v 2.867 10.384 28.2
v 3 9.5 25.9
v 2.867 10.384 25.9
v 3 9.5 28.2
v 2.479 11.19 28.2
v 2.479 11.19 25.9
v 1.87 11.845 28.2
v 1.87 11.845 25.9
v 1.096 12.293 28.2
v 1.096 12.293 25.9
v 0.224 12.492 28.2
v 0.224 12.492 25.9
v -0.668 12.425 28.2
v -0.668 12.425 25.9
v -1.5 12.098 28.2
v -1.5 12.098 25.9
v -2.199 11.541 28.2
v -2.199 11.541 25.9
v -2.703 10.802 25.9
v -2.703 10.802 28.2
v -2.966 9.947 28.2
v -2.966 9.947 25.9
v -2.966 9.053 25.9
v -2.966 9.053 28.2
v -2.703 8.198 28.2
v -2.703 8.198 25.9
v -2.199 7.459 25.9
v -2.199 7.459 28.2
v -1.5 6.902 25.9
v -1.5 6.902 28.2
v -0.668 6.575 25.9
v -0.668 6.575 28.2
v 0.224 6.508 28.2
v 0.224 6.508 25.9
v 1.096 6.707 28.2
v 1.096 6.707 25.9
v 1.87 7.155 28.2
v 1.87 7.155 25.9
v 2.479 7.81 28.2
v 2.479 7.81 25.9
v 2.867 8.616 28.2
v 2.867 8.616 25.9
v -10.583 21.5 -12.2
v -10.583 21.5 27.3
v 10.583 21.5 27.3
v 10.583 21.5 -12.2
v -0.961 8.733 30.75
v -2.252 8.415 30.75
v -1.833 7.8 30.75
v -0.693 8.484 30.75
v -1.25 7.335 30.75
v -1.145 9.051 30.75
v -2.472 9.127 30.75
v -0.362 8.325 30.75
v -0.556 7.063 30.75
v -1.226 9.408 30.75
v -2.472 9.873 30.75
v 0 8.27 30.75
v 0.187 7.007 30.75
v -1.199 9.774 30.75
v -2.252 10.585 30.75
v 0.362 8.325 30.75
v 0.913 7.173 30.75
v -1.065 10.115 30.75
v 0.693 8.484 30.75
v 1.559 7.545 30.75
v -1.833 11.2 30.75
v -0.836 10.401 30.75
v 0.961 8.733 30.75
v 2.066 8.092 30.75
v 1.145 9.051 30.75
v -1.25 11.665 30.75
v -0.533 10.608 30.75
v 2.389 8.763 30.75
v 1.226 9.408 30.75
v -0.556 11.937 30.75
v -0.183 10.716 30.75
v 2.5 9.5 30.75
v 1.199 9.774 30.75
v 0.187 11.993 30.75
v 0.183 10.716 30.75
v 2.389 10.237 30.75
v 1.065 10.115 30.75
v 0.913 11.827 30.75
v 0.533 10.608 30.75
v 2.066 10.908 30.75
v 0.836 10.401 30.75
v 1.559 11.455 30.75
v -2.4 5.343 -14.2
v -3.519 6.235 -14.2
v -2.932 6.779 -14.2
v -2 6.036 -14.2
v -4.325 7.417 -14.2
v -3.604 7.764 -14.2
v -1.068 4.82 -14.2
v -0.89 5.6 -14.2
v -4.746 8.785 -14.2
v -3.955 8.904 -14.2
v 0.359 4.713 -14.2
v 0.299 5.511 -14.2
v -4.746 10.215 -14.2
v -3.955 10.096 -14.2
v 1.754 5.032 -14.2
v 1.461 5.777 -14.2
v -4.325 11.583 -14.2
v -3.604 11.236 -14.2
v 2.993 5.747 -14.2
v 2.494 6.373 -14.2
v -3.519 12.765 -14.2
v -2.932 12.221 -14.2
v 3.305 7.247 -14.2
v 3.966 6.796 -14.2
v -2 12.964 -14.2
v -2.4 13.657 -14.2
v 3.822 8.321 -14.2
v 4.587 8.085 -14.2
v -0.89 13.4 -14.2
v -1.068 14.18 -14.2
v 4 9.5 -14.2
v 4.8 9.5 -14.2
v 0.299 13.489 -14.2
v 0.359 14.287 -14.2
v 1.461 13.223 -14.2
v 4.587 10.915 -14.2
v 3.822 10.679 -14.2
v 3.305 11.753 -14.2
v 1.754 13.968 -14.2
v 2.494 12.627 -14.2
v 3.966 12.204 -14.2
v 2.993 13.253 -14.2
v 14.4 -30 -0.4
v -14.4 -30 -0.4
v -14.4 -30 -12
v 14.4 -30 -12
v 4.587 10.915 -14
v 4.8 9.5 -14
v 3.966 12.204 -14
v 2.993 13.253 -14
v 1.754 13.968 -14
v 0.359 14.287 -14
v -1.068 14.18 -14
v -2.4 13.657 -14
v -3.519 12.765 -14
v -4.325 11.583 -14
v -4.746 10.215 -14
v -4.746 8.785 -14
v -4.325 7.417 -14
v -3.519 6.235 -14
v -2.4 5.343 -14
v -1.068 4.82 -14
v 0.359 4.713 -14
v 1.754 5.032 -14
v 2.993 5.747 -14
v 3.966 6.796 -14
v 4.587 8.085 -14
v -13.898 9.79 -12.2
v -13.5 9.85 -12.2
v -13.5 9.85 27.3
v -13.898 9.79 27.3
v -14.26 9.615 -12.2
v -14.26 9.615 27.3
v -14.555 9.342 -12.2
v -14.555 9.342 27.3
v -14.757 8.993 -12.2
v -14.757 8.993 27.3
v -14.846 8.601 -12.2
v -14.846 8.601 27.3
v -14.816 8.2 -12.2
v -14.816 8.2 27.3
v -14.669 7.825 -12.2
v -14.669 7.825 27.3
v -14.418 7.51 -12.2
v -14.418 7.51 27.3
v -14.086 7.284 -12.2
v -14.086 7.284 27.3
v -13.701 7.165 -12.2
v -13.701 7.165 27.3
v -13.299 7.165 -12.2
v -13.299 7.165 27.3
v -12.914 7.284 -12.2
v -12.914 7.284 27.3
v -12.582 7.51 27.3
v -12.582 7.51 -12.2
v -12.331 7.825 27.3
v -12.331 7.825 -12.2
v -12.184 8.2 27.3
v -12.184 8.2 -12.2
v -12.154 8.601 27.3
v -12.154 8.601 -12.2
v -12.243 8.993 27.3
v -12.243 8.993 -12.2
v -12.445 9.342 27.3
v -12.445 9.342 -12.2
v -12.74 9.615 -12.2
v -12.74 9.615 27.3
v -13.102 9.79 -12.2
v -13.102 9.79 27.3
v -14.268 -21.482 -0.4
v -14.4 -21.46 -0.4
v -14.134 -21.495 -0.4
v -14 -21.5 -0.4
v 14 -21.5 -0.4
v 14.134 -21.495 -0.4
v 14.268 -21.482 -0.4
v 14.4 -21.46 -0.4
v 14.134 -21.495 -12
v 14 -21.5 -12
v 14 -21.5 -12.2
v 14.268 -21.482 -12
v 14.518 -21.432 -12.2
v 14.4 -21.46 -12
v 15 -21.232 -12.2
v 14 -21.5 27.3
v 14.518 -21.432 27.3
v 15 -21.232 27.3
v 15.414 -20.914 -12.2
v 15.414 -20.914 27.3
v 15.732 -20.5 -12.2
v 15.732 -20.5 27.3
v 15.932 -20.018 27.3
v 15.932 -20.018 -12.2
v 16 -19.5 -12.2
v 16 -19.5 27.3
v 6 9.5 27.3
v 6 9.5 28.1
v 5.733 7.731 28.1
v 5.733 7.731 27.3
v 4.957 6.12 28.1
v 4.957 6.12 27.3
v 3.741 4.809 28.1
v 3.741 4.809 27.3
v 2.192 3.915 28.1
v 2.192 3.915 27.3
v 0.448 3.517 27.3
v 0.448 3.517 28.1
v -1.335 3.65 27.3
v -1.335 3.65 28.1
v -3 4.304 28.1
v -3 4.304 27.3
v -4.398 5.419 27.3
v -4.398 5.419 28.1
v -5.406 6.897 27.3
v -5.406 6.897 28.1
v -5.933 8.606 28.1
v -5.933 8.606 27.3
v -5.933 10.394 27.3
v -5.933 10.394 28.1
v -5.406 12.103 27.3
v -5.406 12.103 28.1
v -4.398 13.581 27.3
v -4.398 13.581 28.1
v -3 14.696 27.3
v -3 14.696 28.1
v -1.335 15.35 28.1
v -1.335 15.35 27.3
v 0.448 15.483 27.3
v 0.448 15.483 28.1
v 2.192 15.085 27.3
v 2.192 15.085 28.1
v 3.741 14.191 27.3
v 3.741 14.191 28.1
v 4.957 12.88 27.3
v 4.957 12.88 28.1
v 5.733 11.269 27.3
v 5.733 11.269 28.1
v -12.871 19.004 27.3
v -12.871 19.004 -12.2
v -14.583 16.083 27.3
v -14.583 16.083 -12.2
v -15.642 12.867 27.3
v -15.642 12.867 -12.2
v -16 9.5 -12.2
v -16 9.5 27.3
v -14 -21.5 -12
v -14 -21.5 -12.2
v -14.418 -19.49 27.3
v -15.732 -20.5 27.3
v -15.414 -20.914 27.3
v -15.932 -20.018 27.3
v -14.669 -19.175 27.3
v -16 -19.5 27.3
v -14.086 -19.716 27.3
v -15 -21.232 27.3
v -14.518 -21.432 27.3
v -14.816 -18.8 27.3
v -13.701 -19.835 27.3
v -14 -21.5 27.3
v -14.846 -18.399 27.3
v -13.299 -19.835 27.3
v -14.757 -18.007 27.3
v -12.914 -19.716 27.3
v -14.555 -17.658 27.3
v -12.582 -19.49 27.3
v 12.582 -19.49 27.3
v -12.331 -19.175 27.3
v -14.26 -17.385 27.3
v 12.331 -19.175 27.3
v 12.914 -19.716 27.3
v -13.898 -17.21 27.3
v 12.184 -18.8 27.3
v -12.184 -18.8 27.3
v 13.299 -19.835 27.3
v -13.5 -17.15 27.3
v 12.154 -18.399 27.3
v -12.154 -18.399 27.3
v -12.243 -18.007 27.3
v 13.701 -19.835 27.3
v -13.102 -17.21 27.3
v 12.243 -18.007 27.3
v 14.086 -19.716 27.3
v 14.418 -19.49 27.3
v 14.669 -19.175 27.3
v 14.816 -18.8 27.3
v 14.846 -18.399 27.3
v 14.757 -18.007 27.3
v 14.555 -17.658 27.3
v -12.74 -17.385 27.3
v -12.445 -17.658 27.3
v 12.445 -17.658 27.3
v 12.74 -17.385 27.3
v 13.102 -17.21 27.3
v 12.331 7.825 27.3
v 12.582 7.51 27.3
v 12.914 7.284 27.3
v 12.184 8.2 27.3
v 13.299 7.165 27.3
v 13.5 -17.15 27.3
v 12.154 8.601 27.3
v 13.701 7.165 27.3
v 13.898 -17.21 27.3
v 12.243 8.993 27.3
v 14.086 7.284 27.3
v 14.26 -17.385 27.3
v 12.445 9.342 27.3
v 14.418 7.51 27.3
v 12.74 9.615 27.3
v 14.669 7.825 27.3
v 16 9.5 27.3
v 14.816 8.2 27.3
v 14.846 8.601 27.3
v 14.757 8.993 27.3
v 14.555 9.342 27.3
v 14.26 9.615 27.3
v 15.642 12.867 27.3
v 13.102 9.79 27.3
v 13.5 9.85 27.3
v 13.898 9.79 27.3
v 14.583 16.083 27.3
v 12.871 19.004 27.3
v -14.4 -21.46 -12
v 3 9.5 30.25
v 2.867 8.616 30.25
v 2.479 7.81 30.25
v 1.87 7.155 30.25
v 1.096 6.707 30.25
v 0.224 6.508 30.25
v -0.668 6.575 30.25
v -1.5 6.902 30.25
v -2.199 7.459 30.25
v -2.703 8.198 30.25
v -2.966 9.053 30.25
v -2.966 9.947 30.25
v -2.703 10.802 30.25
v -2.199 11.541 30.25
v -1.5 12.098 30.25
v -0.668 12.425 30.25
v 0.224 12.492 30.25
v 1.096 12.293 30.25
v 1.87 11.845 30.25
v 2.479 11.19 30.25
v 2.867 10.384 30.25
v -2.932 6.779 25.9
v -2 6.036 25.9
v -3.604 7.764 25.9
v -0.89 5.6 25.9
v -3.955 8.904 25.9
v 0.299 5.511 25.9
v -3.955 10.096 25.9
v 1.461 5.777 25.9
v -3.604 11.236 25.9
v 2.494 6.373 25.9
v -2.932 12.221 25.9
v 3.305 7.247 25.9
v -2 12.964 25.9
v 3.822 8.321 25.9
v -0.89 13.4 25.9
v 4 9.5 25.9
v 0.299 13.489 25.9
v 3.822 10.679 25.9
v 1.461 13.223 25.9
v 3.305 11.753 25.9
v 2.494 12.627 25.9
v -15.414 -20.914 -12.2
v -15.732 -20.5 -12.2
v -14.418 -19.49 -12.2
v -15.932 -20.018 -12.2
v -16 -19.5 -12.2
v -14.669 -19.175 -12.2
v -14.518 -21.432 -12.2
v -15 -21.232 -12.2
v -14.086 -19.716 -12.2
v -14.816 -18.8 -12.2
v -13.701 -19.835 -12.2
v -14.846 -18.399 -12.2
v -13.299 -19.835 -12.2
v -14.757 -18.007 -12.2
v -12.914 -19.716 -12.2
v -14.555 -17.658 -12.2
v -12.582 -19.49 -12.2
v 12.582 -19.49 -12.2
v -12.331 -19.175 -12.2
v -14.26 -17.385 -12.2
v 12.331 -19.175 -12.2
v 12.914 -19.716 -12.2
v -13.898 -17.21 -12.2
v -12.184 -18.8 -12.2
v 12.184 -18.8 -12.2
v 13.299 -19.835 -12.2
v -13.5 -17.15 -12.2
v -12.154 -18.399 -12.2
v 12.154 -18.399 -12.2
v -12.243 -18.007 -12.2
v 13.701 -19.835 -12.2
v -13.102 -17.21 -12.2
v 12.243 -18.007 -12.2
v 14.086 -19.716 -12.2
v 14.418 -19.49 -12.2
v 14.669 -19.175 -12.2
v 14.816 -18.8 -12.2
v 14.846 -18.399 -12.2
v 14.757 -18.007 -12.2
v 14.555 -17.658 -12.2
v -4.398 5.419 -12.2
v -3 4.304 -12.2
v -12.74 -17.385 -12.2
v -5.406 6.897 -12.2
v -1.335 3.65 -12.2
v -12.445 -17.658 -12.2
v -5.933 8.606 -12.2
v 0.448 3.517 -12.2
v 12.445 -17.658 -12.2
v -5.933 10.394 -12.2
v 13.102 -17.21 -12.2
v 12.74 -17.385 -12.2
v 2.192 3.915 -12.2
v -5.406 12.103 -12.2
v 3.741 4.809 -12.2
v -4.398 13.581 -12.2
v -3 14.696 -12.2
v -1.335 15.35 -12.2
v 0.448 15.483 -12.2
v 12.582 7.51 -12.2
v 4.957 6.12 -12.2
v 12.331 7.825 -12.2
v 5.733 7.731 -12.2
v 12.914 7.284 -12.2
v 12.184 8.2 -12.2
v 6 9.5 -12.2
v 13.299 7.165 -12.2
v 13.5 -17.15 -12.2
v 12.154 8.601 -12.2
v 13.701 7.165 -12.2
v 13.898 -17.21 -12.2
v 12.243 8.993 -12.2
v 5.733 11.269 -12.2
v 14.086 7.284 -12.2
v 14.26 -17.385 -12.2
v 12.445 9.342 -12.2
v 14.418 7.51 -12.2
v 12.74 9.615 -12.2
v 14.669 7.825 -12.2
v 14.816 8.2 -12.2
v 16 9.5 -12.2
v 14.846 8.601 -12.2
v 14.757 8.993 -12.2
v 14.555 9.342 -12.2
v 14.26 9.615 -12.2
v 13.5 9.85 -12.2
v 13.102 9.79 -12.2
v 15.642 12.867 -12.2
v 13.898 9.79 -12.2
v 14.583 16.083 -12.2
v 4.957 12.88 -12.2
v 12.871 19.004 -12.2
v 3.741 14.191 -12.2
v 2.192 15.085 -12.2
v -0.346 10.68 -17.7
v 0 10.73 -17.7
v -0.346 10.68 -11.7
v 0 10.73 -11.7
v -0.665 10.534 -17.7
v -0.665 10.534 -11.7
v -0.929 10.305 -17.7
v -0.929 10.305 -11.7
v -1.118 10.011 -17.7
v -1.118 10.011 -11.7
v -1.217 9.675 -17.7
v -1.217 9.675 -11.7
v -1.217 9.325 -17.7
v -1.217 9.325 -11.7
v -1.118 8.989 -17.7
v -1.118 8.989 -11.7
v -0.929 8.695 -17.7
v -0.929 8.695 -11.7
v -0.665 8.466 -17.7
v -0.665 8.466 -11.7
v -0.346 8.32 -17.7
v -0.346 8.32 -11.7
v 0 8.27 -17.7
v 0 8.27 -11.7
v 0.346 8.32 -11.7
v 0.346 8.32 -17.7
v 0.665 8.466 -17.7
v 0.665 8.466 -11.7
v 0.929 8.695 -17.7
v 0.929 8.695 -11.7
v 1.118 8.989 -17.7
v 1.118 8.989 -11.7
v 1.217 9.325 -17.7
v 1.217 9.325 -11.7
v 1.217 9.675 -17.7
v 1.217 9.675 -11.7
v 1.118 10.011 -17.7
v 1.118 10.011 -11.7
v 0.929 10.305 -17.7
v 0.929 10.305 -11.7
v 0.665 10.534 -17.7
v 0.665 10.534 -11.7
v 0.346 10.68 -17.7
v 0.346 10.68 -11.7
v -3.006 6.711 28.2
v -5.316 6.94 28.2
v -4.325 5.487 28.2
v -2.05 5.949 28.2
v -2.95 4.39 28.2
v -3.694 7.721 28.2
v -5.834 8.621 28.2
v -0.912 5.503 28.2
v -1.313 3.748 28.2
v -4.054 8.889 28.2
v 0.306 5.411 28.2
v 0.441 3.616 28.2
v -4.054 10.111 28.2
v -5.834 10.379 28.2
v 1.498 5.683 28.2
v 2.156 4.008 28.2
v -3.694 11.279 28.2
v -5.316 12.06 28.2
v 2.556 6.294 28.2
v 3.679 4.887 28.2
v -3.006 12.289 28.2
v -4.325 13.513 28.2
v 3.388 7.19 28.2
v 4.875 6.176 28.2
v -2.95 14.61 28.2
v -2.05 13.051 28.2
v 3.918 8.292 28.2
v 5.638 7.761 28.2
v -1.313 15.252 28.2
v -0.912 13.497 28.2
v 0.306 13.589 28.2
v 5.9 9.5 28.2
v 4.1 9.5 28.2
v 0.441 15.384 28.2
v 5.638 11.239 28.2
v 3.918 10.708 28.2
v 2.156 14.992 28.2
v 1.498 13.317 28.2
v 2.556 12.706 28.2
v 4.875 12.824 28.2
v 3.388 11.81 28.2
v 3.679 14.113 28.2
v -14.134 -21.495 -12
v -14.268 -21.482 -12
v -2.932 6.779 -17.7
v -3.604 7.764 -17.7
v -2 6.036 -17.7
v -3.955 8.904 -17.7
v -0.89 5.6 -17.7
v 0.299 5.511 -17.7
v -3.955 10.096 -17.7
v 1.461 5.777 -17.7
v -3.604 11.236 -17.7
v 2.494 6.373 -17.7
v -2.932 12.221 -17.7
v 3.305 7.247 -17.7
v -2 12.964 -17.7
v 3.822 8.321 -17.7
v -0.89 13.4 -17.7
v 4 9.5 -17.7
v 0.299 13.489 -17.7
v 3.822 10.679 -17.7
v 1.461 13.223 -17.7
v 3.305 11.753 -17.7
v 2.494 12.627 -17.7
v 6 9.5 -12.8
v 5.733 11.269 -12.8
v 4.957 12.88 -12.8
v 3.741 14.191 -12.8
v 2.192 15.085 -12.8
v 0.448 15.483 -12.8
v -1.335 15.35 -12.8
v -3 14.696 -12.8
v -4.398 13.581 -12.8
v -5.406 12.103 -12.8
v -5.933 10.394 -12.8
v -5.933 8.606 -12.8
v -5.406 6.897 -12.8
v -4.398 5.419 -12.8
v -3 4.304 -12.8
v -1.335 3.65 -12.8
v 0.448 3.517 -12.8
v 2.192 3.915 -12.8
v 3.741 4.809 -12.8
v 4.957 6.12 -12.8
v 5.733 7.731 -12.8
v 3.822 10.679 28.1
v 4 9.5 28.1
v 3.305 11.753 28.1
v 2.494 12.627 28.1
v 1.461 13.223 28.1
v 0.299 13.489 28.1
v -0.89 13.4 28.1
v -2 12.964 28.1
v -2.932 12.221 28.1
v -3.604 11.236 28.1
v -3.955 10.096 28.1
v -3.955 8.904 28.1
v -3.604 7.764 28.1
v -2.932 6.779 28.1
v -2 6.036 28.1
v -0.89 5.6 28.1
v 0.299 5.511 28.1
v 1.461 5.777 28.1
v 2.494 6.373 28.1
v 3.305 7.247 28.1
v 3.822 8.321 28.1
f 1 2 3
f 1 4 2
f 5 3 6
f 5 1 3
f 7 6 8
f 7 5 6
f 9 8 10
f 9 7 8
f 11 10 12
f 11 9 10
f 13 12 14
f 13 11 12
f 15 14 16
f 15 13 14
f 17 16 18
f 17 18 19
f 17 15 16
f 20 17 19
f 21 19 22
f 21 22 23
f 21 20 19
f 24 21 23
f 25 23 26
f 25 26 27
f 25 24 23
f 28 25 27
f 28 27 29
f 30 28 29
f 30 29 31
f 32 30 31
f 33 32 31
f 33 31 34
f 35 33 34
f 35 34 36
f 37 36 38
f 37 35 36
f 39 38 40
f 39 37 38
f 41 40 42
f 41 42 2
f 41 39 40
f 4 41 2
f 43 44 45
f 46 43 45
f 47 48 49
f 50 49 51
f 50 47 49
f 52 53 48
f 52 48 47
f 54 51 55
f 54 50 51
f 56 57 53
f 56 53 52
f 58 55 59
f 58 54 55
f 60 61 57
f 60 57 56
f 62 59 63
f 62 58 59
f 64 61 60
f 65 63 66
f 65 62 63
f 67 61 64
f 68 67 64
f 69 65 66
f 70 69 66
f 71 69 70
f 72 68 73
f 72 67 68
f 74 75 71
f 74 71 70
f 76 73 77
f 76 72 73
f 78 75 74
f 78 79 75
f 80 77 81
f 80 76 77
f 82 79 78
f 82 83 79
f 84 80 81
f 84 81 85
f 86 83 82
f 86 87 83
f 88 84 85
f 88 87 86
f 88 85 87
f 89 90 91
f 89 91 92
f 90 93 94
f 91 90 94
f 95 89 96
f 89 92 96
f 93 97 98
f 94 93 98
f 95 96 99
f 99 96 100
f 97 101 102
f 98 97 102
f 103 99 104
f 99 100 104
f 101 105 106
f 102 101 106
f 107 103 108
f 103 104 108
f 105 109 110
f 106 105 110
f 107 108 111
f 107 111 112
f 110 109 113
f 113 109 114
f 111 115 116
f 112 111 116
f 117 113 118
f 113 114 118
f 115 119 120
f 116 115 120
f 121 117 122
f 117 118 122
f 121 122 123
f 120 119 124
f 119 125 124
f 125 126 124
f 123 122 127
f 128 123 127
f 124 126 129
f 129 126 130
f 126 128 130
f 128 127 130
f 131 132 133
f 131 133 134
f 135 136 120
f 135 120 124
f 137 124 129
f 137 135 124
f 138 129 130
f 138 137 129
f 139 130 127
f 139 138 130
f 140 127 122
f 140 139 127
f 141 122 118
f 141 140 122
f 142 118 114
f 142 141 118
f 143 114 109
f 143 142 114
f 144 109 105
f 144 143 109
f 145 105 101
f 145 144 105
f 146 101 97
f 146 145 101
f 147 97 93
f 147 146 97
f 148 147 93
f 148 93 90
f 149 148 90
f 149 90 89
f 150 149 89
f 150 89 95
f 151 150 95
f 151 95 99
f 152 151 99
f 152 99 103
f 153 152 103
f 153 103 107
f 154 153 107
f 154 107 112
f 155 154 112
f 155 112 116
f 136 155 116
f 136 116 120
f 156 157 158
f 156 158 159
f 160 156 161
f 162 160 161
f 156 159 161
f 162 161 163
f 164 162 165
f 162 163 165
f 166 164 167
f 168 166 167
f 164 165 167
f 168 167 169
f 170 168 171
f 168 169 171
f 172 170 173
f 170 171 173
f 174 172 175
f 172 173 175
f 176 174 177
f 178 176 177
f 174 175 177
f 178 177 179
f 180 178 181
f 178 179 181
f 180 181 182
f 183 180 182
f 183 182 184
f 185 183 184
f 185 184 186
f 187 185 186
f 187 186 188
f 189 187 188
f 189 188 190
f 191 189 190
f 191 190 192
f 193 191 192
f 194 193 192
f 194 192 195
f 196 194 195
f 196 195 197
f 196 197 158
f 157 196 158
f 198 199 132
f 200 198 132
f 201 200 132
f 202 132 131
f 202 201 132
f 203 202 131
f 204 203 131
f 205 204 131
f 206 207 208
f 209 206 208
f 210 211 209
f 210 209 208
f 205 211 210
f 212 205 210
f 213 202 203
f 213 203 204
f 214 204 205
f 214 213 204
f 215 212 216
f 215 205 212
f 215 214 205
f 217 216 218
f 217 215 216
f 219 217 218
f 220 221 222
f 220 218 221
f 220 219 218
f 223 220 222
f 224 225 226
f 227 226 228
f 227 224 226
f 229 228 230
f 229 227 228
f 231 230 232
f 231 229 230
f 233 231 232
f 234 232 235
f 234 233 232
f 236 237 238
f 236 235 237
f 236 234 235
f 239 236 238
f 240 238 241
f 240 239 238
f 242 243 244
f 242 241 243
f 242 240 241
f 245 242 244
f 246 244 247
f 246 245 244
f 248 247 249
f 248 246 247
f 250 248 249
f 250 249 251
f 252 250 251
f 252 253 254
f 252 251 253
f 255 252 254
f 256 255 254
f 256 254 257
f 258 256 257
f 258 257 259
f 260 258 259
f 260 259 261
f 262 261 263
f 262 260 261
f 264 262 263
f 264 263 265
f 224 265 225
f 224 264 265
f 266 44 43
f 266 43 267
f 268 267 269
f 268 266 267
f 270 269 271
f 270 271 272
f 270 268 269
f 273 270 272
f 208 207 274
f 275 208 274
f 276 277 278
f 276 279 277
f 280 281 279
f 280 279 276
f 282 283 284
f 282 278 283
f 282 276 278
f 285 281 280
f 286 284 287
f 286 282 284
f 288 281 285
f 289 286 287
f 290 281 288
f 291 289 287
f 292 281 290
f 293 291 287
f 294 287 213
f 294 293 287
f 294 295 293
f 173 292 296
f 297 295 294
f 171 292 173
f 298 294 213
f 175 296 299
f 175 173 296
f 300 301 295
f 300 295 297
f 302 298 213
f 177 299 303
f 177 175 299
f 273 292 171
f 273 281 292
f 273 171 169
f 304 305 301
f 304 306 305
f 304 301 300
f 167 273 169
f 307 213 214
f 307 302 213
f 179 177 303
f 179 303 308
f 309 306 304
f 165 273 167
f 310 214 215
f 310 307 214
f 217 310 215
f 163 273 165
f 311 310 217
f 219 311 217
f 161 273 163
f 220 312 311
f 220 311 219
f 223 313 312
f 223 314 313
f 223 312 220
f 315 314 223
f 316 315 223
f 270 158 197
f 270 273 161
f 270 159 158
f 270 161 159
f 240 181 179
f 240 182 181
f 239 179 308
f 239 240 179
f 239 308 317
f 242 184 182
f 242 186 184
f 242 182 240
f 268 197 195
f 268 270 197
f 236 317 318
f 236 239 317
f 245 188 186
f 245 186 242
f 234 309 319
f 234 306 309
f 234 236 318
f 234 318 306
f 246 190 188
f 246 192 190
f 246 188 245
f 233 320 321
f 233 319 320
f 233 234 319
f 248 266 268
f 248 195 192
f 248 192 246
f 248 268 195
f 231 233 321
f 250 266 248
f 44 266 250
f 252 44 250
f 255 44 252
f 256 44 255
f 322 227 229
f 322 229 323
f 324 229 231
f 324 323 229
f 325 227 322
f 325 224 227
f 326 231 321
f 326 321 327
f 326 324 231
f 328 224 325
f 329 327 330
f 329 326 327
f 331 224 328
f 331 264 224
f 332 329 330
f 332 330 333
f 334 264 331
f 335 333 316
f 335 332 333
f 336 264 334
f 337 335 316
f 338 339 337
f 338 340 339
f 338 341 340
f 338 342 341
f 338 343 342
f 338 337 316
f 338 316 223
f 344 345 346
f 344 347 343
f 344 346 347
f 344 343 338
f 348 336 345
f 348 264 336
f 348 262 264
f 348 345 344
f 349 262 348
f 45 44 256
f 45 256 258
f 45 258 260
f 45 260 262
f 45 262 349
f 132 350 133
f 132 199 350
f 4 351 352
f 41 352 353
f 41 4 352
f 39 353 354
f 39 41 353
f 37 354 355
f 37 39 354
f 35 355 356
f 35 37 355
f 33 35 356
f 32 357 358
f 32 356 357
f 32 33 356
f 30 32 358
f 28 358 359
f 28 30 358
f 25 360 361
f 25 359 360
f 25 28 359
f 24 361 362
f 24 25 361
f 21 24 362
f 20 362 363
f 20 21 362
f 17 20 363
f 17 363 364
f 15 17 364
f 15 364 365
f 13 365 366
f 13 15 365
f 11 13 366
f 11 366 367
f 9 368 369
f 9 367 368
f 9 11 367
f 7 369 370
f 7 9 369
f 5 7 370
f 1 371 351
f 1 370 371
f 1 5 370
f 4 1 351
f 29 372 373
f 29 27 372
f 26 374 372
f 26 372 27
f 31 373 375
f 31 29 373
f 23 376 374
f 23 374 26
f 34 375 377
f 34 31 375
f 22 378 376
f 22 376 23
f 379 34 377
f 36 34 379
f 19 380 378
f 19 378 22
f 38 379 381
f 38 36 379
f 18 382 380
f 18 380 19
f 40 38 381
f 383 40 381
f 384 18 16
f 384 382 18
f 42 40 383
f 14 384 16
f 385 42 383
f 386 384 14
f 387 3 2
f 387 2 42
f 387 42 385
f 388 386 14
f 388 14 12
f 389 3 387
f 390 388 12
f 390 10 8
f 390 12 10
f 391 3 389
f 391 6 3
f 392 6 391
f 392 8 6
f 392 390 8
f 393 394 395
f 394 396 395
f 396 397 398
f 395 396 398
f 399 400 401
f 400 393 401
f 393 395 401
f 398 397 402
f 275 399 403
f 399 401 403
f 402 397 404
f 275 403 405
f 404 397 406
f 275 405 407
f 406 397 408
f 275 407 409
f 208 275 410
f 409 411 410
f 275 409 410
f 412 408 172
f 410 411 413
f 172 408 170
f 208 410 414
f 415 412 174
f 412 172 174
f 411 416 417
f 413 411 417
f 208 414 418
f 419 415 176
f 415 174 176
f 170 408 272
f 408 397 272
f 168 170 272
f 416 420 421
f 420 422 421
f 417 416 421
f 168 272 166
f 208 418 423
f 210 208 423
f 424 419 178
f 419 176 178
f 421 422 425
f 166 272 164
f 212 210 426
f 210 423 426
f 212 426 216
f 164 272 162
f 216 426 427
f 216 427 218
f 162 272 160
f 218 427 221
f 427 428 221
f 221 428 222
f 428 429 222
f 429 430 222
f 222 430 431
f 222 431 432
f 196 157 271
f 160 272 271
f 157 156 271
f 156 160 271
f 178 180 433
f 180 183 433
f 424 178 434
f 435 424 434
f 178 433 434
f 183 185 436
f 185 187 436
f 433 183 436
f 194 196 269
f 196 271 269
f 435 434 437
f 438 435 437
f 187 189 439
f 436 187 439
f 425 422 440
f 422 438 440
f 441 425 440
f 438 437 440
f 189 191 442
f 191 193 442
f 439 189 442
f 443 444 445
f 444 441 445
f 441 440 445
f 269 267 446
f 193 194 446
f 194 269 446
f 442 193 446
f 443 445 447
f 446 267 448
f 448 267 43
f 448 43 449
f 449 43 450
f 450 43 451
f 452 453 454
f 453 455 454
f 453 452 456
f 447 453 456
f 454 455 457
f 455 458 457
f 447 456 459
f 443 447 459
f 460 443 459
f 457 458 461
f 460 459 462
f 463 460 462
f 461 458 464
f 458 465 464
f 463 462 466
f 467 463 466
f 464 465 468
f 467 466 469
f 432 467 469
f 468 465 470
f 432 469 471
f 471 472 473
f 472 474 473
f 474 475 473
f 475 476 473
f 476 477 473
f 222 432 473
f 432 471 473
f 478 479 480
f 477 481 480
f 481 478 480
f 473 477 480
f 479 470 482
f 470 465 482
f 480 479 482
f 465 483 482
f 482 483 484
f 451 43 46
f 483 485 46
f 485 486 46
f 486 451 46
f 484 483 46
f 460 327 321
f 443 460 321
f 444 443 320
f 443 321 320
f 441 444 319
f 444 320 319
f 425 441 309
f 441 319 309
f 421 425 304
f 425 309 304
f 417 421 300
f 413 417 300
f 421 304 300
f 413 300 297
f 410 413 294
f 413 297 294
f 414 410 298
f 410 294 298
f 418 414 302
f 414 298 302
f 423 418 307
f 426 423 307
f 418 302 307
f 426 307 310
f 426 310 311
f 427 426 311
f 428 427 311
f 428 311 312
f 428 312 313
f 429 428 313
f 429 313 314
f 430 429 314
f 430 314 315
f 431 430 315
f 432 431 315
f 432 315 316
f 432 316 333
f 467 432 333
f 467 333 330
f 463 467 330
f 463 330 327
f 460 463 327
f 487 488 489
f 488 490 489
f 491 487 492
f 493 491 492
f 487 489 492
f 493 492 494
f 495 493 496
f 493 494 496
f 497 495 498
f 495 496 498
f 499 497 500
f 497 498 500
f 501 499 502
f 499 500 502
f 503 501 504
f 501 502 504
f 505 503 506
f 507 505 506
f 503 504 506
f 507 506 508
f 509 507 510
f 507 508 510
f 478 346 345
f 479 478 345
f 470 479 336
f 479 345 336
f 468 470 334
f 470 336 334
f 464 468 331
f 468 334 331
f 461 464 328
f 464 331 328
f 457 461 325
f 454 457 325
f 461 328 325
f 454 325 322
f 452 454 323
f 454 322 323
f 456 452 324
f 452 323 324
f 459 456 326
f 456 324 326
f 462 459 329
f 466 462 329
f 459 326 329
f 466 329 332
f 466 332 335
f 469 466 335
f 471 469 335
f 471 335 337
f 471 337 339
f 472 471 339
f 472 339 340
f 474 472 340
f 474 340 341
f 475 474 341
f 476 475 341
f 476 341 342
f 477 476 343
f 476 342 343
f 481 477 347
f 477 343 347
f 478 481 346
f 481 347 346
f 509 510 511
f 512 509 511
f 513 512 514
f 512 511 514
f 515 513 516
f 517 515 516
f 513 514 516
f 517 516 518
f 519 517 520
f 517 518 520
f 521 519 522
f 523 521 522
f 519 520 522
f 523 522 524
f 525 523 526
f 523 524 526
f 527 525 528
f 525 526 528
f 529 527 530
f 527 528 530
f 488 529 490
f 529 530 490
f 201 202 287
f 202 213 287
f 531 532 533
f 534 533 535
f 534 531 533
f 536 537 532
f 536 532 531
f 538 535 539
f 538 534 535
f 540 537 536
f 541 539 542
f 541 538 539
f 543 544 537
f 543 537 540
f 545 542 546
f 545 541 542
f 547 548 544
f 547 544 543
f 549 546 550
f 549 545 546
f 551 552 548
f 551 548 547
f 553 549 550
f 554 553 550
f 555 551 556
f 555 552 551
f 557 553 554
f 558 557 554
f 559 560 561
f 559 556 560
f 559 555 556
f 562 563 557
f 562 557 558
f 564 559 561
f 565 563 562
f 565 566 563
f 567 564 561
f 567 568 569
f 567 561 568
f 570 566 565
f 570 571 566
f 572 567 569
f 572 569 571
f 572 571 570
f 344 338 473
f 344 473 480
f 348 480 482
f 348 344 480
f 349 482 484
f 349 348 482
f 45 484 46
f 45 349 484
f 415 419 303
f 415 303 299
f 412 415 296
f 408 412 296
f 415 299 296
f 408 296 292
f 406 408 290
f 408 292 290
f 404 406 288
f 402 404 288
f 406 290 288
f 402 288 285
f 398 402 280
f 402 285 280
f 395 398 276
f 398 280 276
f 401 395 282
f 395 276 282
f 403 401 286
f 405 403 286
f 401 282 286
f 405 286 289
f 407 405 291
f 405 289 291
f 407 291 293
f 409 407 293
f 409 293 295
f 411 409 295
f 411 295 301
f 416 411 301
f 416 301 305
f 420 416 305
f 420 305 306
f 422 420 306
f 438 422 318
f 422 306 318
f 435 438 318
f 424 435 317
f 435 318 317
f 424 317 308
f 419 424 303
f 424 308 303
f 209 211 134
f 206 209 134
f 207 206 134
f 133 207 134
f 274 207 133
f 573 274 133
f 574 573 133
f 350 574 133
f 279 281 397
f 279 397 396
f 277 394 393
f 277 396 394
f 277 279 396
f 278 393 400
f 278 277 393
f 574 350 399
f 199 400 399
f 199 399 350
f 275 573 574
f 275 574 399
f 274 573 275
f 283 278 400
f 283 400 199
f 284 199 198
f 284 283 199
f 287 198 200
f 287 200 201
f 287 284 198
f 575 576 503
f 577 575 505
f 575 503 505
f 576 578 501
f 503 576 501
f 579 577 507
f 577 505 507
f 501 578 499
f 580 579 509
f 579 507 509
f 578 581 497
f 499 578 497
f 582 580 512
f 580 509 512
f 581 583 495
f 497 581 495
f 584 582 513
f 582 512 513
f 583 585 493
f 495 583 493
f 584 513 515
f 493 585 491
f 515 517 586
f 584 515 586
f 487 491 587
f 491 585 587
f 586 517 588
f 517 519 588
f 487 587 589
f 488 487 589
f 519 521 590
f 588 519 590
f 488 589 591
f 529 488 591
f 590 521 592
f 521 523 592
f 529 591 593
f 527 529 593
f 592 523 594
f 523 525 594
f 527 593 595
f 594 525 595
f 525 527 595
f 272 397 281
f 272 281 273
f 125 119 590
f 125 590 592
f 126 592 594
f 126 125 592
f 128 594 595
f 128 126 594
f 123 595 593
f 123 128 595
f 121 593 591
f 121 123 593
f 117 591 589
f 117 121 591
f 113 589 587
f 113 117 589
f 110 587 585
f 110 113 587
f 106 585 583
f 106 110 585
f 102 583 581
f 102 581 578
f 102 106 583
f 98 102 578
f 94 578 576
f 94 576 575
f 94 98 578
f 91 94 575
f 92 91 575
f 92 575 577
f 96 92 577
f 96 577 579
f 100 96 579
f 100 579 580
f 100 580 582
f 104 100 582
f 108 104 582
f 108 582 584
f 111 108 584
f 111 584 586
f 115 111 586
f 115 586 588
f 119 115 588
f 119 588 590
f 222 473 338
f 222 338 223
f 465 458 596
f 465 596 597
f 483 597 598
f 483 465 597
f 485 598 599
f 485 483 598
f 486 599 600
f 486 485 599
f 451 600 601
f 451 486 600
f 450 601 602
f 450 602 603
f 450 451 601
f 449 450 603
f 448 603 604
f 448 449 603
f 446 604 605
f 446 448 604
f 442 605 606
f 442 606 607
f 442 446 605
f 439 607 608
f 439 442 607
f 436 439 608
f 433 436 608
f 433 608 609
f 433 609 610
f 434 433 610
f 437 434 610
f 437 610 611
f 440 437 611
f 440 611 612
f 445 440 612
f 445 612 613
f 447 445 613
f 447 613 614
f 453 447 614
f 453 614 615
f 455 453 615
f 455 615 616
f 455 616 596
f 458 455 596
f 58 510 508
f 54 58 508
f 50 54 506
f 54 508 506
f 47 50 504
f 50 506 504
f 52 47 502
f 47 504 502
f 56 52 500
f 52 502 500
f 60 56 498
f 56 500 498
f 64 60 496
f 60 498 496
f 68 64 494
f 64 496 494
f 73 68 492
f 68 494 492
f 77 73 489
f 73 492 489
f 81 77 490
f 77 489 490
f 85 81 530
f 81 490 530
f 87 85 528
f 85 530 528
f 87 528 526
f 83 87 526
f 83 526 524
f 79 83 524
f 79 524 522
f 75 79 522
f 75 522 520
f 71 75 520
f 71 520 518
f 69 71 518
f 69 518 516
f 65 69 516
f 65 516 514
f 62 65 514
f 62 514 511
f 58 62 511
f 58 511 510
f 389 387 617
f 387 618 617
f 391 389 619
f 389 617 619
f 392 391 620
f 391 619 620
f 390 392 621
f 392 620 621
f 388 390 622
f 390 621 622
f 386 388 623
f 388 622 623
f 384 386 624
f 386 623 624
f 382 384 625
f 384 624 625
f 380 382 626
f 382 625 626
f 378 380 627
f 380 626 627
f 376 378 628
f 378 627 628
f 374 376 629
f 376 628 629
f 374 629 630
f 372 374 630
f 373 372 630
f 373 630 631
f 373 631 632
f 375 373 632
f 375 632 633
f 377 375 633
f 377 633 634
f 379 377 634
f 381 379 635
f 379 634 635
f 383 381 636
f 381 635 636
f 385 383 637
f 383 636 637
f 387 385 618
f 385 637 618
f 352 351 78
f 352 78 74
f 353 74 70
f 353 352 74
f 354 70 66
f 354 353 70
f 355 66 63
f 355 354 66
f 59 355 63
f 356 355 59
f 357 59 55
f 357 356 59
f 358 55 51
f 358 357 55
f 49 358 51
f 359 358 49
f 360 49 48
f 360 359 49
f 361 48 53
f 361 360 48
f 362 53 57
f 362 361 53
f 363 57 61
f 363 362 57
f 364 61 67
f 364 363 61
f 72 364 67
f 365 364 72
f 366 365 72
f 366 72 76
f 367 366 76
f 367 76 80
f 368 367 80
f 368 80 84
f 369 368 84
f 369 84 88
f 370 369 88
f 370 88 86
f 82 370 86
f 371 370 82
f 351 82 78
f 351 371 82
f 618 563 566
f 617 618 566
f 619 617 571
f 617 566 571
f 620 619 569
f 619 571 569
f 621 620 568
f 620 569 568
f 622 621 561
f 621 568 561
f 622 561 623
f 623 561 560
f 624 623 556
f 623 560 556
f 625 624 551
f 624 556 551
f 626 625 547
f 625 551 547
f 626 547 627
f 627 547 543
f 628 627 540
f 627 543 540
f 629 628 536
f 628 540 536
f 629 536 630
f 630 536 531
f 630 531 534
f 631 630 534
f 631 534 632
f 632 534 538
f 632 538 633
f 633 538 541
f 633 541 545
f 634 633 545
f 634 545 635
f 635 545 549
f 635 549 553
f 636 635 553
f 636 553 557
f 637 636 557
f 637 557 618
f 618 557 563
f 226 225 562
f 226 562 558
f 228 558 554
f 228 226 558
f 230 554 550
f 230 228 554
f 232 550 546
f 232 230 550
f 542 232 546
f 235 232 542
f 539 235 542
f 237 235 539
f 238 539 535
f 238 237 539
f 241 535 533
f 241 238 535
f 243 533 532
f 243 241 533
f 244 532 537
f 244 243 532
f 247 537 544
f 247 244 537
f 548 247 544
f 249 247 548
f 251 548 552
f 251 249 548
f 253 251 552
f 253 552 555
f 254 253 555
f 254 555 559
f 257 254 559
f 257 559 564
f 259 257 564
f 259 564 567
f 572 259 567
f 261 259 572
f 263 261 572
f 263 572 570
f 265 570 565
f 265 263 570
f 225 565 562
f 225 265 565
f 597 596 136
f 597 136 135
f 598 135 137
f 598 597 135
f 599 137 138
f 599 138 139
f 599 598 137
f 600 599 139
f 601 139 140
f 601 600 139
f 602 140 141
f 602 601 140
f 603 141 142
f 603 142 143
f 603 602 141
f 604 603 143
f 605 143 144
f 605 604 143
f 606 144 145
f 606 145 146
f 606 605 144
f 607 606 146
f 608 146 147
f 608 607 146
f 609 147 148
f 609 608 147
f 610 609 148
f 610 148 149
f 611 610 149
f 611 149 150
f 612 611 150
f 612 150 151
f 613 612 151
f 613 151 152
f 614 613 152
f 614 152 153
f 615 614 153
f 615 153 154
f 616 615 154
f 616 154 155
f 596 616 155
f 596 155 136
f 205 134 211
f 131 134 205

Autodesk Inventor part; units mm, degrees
ref_plane "YZ Plane" through (0, 0, 0) normal (1, 0, 0) x (0, 1, 0)
ref_plane "XZ Plane" through (0, 0, 0) normal (0, 1, 0) x (-1, 0, 0)
ref_plane "XY Plane" through (0, 0, 0) normal (0, 0, 1) x (1, 0, 0)
sketch "スケッチ1" plane through (0, 0, 0) normal (0, 0, 1) x (1, 0, 0)
  line L0 (-16, 21.5) -> (-10.583, 21.5) construction
  line L1 (16, 21.5) -> (16, 9.5) construction
  line L2 (16, -21.5) -> (-16, -21.5)
  line L3 (-16, -21.5) -> (-16, 9.5)
  line L4 (-16, 21.5) -> (16, -21.5) construction
  line L5 (16, 21.5) -> (-16, -21.5) construction
  line L6 (-14.4, -21.5) -> (-14.4, -30)
  line L7 (-14.4, -30) -> (14.4, -30)
  line L8 (0, 21.5) -> (0, -21.5) construction
  line L9 (14.4, -21.5) -> (14.4, -30)
  line L10 (-13.5, 21.5) -> (-13.5, -21.5) construction
  circle A0 centre (0, 9.5) radius 6
  circle A1 centre (0, 9.5) radius 4
  arc A2 (-10.583, 21.5) -> (-16, 9.5) centre (0, 9.5) ccw
  arc A3 (16, 9.5) -> (10.583, 21.5) centre (0, 9.5) ccw
  line L11 (-10.583, 21.5) -> (10.583, 21.5)
  line L12 (-16, 9.5) -> (-16, 21.5) construction
  line L13 (10.583, 21.5) -> (16, 21.5) construction
  line L14 (16, 9.5) -> (16, -21.5)
  circle A4 centre (0, 9.5) radius 3
  circle A5 centre (0, 9.5) radius 4.8
  point P0 (0, 0)
  point P1 (-13.5, 8.5)
  point P2 (-13.5, -18.5)
  point P3 (13.5, 8.5)
  point P4 (13.5, -18.5)
  dimension "d0" = 32
  dimension "d1" = 43
  dimension "d4" = 28.8
  dimension "d5" = 8.5
  dimension "d8" = 27
  dimension "d9" = 8.5
  dimension "d12" = 18.5
  dimension "d13" = 12
  dimension "d14" = 8
  dimension "d15" = 9.5
  dimension "d17" = 16
  dimension "d32" = 13.5
  dimension "d47" = 6
  dimension "d67" = 9.6
extrude "押し出し1" add sketch "スケッチ1" against normal blind 12.2 contours L2 L3 A2 L11 A3 L14 | A0 | A1 | A4 | A5
extrude "押し出し2" add sketch "スケッチ1" against normal blind 12 contours L9 L7 L6 L2
extrude "押し出し3" add sketch "スケッチ1" against normal blind 14 contours A0 | A1 | A4 | A5
extrude "押し出し4" add sketch "スケッチ1" against normal blind 17.7 contours A1 | A4
chamfer "面取り1" distance 1.2 angle 45 1 edges at (-6, 9.5, -14)
sketch "スケッチ2" plane through (0, 9.5, -17.7) normal (0, 0, -1) x (-1, 0, 0)
  circle A0 centre (0, 0) radius 4 projected
  point P0 (0, -9.5)
hole "穴1" at (0, 9.5, -17.7) direction (0, 0, 1) diameter 2.459 depth 6 thread size "M3x0.5" class "6H" standard "ANSI Metric M Profile"
extrude "押し出し5" add sketch "スケッチ1" along normal blind 27.3 contours L2 L3 A2 L11 A3 L14 | A0 | A1 | A4 | A5
hole "穴2" at (-13.5, 8.5, 0) at (-13.5, -18.5, 0) at (13.5, 8.5, 0) at (13.5, -18.5, 0) direction (0, 0, 1) diameter 2.7 end through all both
extrude "押し出し6" cut sketch "スケッチ1" against normal blind 0.4 contours L9 L7 L6 L2
fillet "フィレット1" radius 2 2 edges at (16, -21.5, 7.55) (-16, -21.5, 7.55)
extrude "押し出し7" add sketch "スケッチ1" along normal blind 28.2 contours A0 | A1 | A4 | A5
extrude "押し出し8" add sketch "スケッチ1" along normal blind 30.75 contours A4
sketch "スケッチ3" plane through (0, 9.5, 30.75) normal (0, 0, 1) x (1, 0, 0)
  circle A0 centre (0, 0) radius 1.2295 projected
  point P0 (0, -9.5)
hole "穴3" at (0, 9.5, 30.75) direction (0, 0, -1) diameter 2.459 end through all thread size "M3x0.5" class "6H" standard "ANSI Metric M Profile"
sketch "スケッチ4" plane through (0, 9.5, 28.2) normal (0, 0, 1) x (1, 0, 0)
  circle A0 centre (0, 0) radius 4
  circle A1 centre (0, 0) radius 3
  point P0 (0, -9.5)
extrude "押し出し9" cut sketch "スケッチ4" against normal blind 2.3
chamfer "面取り2" distance 0.5 angle 45 1 edges at (-3, 9.5, 30.75)
extrude "押し出し10" add sketch "スケッチ1" against normal blind 14.2 contours A5
chamfer "面取り4" distance 0.1 angle 45 2 edges at (-6, 9.5, 28.2) (-4, 9.5, 28.2)
properties part number "B3M-SC-1170-A"
